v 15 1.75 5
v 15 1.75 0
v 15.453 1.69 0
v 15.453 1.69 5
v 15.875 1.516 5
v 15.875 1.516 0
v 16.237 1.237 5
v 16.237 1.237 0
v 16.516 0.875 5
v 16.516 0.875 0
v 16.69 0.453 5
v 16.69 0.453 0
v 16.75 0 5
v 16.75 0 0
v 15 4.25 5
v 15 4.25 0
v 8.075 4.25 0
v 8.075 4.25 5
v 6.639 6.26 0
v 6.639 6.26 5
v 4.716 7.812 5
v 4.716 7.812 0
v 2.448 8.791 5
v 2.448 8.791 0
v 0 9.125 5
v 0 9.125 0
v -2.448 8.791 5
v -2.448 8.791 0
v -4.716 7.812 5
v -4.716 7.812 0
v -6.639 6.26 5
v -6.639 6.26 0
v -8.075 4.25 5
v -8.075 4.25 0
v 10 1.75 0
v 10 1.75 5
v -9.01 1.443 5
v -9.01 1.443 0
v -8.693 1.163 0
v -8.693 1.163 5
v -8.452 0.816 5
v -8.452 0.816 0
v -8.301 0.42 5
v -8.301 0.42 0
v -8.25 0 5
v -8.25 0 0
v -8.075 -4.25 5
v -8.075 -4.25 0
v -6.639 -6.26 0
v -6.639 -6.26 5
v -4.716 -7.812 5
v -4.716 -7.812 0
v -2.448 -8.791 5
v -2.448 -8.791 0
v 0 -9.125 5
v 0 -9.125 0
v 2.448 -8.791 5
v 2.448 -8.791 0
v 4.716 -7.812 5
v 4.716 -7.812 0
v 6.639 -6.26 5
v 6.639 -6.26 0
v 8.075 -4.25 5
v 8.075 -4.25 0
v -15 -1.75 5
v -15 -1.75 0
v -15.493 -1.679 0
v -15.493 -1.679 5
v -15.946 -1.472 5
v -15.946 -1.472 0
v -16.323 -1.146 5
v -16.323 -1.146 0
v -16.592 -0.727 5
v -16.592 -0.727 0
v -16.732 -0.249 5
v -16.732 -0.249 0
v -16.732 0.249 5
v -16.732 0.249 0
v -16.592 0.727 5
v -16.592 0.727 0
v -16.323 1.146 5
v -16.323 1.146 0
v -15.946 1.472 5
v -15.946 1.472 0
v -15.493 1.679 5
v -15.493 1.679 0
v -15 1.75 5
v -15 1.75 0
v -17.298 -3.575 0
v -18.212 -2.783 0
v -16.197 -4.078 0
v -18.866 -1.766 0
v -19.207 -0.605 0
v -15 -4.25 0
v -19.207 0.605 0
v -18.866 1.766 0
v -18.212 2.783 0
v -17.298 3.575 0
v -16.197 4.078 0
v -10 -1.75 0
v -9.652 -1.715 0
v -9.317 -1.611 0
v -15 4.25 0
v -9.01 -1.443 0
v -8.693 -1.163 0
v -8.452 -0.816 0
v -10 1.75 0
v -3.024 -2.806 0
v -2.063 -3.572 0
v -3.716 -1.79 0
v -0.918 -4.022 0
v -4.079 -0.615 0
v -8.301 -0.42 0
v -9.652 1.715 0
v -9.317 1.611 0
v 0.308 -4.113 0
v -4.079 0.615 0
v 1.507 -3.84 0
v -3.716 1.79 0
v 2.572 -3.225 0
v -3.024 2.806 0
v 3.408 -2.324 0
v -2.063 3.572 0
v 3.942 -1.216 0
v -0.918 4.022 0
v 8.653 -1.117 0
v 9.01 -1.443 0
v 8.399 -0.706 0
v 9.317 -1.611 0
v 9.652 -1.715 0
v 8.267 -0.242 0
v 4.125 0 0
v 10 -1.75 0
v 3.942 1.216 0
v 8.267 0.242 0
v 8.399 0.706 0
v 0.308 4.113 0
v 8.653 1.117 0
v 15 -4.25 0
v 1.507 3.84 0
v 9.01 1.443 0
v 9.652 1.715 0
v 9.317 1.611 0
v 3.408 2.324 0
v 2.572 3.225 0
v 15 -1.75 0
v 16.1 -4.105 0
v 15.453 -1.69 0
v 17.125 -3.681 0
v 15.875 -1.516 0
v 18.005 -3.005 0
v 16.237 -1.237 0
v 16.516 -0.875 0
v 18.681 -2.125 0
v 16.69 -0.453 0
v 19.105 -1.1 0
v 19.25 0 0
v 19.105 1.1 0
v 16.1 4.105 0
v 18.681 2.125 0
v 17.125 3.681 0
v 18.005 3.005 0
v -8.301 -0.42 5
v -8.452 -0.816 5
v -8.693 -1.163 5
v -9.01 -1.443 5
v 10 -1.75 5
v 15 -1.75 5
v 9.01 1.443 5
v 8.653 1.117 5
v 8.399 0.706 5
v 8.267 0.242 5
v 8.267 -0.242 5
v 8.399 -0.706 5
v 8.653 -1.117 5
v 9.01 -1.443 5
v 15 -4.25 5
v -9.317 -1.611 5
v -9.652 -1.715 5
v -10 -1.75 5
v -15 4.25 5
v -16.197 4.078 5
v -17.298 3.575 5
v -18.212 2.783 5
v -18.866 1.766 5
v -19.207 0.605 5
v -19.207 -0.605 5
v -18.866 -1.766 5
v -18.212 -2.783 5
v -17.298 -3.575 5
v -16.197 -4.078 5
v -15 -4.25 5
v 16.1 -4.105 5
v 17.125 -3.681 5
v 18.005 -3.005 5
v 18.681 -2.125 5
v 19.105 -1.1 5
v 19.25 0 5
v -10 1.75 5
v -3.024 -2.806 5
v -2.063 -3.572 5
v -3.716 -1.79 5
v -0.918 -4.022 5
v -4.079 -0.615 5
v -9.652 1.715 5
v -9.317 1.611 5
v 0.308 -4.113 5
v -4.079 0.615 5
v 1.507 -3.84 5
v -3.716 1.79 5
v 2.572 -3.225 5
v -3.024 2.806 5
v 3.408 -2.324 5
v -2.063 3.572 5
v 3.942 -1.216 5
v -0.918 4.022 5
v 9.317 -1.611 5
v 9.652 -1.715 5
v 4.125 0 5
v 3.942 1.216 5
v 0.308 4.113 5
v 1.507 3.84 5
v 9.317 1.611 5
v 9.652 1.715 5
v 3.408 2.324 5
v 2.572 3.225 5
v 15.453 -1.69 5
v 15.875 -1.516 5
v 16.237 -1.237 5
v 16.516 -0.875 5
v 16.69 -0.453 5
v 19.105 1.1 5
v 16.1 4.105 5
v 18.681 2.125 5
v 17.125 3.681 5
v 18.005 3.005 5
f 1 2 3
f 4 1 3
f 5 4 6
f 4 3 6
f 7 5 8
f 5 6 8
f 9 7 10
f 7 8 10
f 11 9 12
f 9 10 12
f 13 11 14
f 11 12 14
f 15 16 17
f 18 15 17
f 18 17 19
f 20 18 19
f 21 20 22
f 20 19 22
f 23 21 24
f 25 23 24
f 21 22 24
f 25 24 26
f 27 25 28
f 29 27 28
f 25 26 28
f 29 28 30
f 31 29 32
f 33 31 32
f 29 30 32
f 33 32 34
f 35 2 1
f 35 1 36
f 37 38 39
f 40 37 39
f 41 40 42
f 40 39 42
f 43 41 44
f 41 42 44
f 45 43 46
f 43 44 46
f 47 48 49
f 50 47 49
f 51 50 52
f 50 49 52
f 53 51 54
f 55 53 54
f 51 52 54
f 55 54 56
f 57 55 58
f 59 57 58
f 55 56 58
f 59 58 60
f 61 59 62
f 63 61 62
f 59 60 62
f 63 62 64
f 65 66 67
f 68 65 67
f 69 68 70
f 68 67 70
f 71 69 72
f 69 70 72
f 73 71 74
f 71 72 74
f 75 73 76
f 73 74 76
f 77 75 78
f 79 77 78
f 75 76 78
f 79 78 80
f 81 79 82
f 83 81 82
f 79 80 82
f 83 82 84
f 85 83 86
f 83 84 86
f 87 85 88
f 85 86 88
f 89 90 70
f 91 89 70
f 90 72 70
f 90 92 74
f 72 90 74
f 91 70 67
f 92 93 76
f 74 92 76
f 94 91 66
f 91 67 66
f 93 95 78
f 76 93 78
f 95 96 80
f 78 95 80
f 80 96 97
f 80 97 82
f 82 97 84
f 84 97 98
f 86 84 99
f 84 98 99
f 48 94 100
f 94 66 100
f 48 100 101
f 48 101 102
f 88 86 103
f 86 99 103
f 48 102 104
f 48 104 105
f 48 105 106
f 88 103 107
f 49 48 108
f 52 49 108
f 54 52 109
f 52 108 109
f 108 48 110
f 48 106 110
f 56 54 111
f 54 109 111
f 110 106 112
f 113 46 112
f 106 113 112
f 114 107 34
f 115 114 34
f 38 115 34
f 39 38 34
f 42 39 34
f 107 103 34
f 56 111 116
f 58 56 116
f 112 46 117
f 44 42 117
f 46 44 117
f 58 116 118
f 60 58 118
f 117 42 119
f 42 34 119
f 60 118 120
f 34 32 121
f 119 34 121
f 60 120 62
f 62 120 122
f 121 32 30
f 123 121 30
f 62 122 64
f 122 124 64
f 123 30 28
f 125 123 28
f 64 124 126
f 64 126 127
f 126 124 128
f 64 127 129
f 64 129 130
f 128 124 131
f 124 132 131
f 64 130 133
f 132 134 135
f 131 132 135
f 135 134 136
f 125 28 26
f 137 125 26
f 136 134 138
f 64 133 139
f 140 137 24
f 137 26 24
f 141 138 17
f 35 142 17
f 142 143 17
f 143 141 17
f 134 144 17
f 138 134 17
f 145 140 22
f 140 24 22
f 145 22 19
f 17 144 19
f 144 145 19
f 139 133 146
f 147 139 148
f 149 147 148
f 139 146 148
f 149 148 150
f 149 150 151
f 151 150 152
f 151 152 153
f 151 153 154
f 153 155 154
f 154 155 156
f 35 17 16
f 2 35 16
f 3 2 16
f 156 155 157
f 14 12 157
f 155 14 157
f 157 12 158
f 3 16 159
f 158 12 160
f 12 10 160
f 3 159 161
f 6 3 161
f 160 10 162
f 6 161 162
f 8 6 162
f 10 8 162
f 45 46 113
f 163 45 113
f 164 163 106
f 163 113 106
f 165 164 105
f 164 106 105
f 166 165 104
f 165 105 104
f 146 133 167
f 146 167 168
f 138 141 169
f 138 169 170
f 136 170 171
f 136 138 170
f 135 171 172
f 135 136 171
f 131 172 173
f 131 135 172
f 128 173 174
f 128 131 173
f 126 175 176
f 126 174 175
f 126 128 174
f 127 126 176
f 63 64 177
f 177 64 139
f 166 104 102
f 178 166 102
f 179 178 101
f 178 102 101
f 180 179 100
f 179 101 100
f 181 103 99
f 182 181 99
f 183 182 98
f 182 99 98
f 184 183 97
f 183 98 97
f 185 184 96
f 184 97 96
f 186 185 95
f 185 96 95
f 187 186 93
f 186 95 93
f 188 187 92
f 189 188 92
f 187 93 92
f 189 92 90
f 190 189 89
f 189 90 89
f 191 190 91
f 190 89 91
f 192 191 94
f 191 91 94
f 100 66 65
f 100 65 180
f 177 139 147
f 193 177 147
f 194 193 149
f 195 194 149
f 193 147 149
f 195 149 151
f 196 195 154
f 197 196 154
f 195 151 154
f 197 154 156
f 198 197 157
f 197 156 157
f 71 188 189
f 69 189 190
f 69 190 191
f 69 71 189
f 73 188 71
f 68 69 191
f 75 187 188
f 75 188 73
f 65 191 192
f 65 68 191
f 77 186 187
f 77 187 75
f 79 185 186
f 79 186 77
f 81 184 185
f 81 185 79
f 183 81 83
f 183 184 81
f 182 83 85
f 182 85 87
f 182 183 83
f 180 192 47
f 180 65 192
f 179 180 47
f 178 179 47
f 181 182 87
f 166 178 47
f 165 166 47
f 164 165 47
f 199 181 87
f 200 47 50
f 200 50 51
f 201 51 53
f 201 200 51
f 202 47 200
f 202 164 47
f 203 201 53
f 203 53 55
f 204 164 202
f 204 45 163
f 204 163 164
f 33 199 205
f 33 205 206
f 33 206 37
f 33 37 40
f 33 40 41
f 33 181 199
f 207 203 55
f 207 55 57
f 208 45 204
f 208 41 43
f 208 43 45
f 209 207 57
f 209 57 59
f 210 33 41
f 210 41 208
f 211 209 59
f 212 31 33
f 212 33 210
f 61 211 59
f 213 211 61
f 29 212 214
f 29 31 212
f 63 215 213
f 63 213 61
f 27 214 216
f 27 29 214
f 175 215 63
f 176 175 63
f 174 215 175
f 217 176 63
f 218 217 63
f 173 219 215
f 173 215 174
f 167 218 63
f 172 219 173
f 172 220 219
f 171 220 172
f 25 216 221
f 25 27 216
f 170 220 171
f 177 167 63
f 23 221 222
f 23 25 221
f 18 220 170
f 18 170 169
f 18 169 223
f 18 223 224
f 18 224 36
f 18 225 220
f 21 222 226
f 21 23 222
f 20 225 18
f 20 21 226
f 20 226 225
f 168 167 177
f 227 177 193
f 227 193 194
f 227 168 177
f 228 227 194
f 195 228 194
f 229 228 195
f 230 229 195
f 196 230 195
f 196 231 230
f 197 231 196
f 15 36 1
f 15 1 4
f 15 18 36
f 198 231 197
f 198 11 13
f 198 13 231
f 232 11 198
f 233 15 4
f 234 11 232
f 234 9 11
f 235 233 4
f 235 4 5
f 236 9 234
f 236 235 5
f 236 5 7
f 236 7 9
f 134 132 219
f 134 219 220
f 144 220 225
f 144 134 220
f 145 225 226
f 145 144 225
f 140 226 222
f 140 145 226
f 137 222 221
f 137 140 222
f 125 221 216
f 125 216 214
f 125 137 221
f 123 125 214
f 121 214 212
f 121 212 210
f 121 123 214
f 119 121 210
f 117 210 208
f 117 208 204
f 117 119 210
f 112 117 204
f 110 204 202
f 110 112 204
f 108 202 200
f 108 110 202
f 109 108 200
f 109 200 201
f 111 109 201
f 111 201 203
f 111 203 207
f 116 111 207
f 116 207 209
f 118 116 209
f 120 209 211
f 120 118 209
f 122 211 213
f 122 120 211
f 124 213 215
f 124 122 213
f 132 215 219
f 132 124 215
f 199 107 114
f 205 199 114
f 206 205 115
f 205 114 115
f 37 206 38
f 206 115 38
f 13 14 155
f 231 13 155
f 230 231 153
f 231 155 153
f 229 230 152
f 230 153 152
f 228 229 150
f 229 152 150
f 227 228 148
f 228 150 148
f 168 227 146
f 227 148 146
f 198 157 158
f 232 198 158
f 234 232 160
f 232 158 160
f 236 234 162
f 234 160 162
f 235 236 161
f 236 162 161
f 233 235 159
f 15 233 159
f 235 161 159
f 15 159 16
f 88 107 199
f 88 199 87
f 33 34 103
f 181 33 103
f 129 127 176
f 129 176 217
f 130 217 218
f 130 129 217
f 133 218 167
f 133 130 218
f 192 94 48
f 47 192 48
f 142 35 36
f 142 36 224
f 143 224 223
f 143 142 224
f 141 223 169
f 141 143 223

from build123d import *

# Parameters (mm, degrees)
F0_R     = 4.125
F1_DEPTH = 5
F2_DEPTH = 5
F3_DEPTH = 5
F4_DEPTH = 5
F5_DEPTH = 25
F6_DEPTH = 25


with BuildPart() as f1:
    # F0 (on Top) → F1 (new body)
    with BuildSketch(Plane.XY):
        with BuildLine():
            Line((-8.0748451998, 4.25), (8.0748451998, 4.25))
            ThreePointArc((8.0748451998, 4.25), (0, 9.125), (-8.0748451998, 4.25))
        make_face()
        with BuildLine():
            ThreePointArc((8.26015625, -3.8775564117), (5.75, 0), (8.26015625, 3.8775564117))
            ThreePointArc((8.26015625, 3.8775564117), (8.1696234092, 4.0648343573), (8.0748451998, 4.25))
            Line((8.0748451998, 4.25), (-8.0748451998, 4.25))
            ThreePointArc((-8.0748451998, 4.25), (-8.1696234092, 4.0648343573), (-8.26015625, 3.8775564117))
            ThreePointArc((-8.26015625, 3.8775564117), (-6.4323091545, 2.3095631689), (-5.75, 0))
            ThreePointArc((-5.75, 0), (-6.4323091545, -2.3095631689), (-8.26015625, -3.8775564117))
            ThreePointArc((-8.26015625, -3.8775564117), (-8.1696234092, -4.0648343573), (-8.0748451998, -4.25))
            Line((-8.0748451998, -4.25), (8.0748451998, -4.25))
            ThreePointArc((8.0748451998, -4.25), (8.1696234092, -4.0648343573), (8.26015625, -3.8775564117))
        make_face()
        Circle(F0_R, mode=Mode.SUBTRACT)
        with BuildLine():
            ThreePointArc((-8.0748451998, -4.25), (0, -9.125), (8.0748451998, -4.25))
            Line((8.0748451998, -4.25), (-8.0748451998, -4.25))
        make_face()
        with BuildLine():
            ThreePointArc((-5.75, 0), (-6.4323091545, 2.3095631689), (-8.26015625, 3.8775564117))
            ThreePointArc((-8.26015625, 3.8775564117), (-8.7205215176, 2.6866576746), (-9.01015625, 1.4431595028))
            ThreePointArc((-9.01015625, 1.4431595028), (-8.4516578927, 0.8155591449), (-8.25, 0))
            ThreePointArc((-8.25, 0), (-8.4516578927, -0.8155591449), (-9.01015625, -1.4431595028))
            ThreePointArc((-9.01015625, -1.4431595028), (-8.7205215176, -2.6866576746), (-8.26015625, -3.8775564117))
            ThreePointArc((-8.26015625, -3.8775564117), (-6.4323091545, -2.3095631689), (-5.75, 0))
        make_face()
        with BuildLine():
            ThreePointArc((-9.01015625, 1.4431595028), (-8.7205215176, 2.6866576746), (-8.26015625, 3.8775564117))
            ThreePointArc((-8.26015625, 3.8775564117), (-9.1103693883, 4.1558461683), (-10, 4.25))
            ThreePointArc((-10, 4.25), (-11.3144466464, 4.041624675), (-12.5, 3.4369317712))
            ThreePointArc((-12.5, 3.4369317712), (-11.703765196, 2.6827851418), (-11.1270166538, 1.75))
            Line((-11.1270166538, 1.75), (-10, 1.75))
            ThreePointArc((-10, 1.75), (-9.4818441981, 1.6715306055), (-9.01015625, 1.4431595028))
        make_face()
        with BuildLine():
            ThreePointArc((-12.5, 3.4369317712), (-11.3144466464, 4.041624675), (-10, 4.25))
            Line((-10, 4.25), (-15, 4.25))
            ThreePointArc((-15, 4.25), (-13.6855533536, 4.041624675), (-12.5, 3.4369317712))
        make_face()
        with BuildLine():
            ThreePointArc((-13.8729833462, 1.75), (-13.296234804, 2.6827851418), (-12.5, 3.4369317712))
            ThreePointArc((-12.5, 3.4369317712), (-13.6855533536, 4.041624675), (-15, 4.25))
            Line((-15, 4.25), (-15, 1.75))
            Line((-15, 1.75), (-13.8729833462, 1.75))
        make_face()
        with BuildLine():
            Line((-15, 1.75), (-15, 4.25))
            ThreePointArc((-15, 4.25), (-19.25, 0), (-15, -4.25))
            Line((-15, -4.25), (-15, -1.75))
            ThreePointArc((-15, -1.75), (-16.75, 0), (-15, 1.75))
        make_face()
        with BuildLine():
            ThreePointArc((-11.1270166538, 1.75), (-11.703765196, 2.6827851418), (-12.5, 3.4369317712))
            ThreePointArc((-12.5, 3.4369317712), (-13.296234804, 2.6827851418), (-13.8729833462, 1.75))
            Line((-13.8729833462, 1.75), (-11.1270166538, 1.75))
        make_face()
        with BuildLine():
            ThreePointArc((-11, 1.4361406616), (-11.0603815396, 1.5943357195), (-11.1270166538, 1.75))
            Line((-11.1270166538, 1.75), (-13.8729833462, 1.75))
            ThreePointArc((-13.8729833462, 1.75), (-13.9396184604, 1.5943357195), (-14, 1.4361406616))
            ThreePointArc((-14, 1.4361406616), (-13.4487907943, 0.8100925873), (-13.25, 0))
            ThreePointArc((-13.25, 0), (-13.4487907943, -0.8100925873), (-14, -1.4361406616))
            ThreePointArc((-14, -1.4361406616), (-13.9396184604, -1.5943357195), (-13.8729833462, -1.75))
            Line((-13.8729833462, -1.75), (-11.1270166538, -1.75))
            ThreePointArc((-11.1270166538, -1.75), (-11.0603815396, -1.5943357195), (-11, -1.4361406616))
            ThreePointArc((-11, -1.4361406616), (-11.75, 0), (-11, 1.4361406616))
        make_face()
        with BuildLine():
            ThreePointArc((-15, -4.25), (-13.6855533536, -4.041624675), (-12.5, -3.4369317712))
            ThreePointArc((-12.5, -3.4369317712), (-13.296234804, -2.6827851418), (-13.8729833462, -1.75))
            Line((-13.8729833462, -1.75), (-15, -1.75))
            Line((-15, -1.75), (-15, -4.25))
        make_face()
        with BuildLine():
            ThreePointArc((-13.8729833462, -1.75), (-13.296234804, -2.6827851418), (-12.5, -3.4369317712))
            ThreePointArc((-12.5, -3.4369317712), (-11.703765196, -2.6827851418), (-11.1270166538, -1.75))
            Line((-11.1270166538, -1.75), (-13.8729833462, -1.75))
        make_face()
        with BuildLine():
            ThreePointArc((-10, -4.25), (-9.1103693883, -4.1558461683), (-8.26015625, -3.8775564117))
            ThreePointArc((-8.26015625, -3.8775564117), (-8.7205215176, -2.6866576746), (-9.01015625, -1.4431595028))
            ThreePointArc((-9.01015625, -1.4431595028), (-9.4818441981, -1.6715306055), (-10, -1.75))
            Line((-10, -1.75), (-11.1270166538, -1.75))
            ThreePointArc((-11.1270166538, -1.75), (-11.703765196, -2.6827851418), (-12.5, -3.4369317712))
            ThreePointArc((-12.5, -3.4369317712), (-11.3144466464, -4.041624675), (-10, -4.25))
        make_face()
        with BuildLine():
            Line((-15, -4.25), (-10, -4.25))
            ThreePointArc((-10, -4.25), (-11.3144466464, -4.041624675), (-12.5, -3.4369317712))
            ThreePointArc((-12.5, -3.4369317712), (-13.6855533536, -4.041624675), (-15, -4.25))
        make_face()
        with BuildLine():
            ThreePointArc((-14, 1.4361406616), (-13.9396184604, 1.5943357195), (-13.8729833462, 1.75))
            Line((-13.8729833462, 1.75), (-15, 1.75))
            ThreePointArc((-15, 1.75), (-14.4759514134, 1.6696925103), (-14, 1.4361406616))
        make_face()
        with BuildLine():
            ThreePointArc((-11, 1.4361406616), (-10.5240485866, 1.6696925103), (-10, 1.75))
            Line((-10, 1.75), (-11.1270166538, 1.75))
            ThreePointArc((-11.1270166538, 1.75), (-11.0603815396, 1.5943357195), (-11, 1.4361406616))
        make_face()
        with BuildLine():
            Line((-15, -1.75), (-13.8729833462, -1.75))
            ThreePointArc((-13.8729833462, -1.75), (-13.9396184604, -1.5943357195), (-14, -1.4361406616))
            ThreePointArc((-14, -1.4361406616), (-14.4759514134, -1.6696925103), (-15, -1.75))
        make_face()
        with BuildLine():
            Line((-11.1270166538, -1.75), (-10, -1.75))
            ThreePointArc((-10, -1.75), (-10.5240485866, -1.6696925103), (-11, -1.4361406616))
            ThreePointArc((-11, -1.4361406616), (-11.0603815396, -1.5943357195), (-11.1270166538, -1.75))
        make_face()
    extrude(amount=F1_DEPTH)



with BuildPart() as f1b:
    # F0 (on Top) → F1, piece 2 (new body)
    with BuildSketch(Plane.XY):
        with BuildLine():
            Line((15, 4.25), (15, 1.75))
            ThreePointArc((15, 1.75), (16.2374368671, 1.2374368671), (16.75, 0))
            ThreePointArc((16.75, 0), (16.2374368671, -1.2374368671), (15, -1.75))
            Line((15, -1.75), (15, -4.25))
            ThreePointArc((15, -4.25), (18.00520382, -3.00520382), (19.25, 0))
            ThreePointArc((19.25, 0), (18.00520382, 3.00520382), (15, 4.25))
        make_face()
    extrude(amount=F1_DEPTH)


with BuildPart() as f1c:
    # F0 (on Top) → F1, piece 3 (new body)
    with BuildSketch(Plane.XY):
        with BuildLine():
            ThreePointArc((12.5, 3.4369317712), (11.703765196, 2.6827851418), (11.1270166538, 1.75))
            Line((11.1270166538, 1.75), (13.8729833462, 1.75))
            ThreePointArc((13.8729833462, 1.75), (13.296234804, 2.6827851418), (12.5, 3.4369317712))
        make_face()
        with BuildLine():
            ThreePointArc((11, 1.4361406616), (11.5512092057, 0.8100925873), (11.75, 0))
            ThreePointArc((11.75, 0), (11.5512092057, -0.8100925873), (11, -1.4361406616))
            ThreePointArc((11, -1.4361406616), (11.0603815396, -1.5943357195), (11.1270166538, -1.75))
            Line((11.1270166538, -1.75), (13.8729833462, -1.75))
            ThreePointArc((13.8729833462, -1.75), (13.9396184604, -1.5943357195), (14, -1.4361406616))
            ThreePointArc((14, -1.4361406616), (13.25, 0), (14, 1.4361406616))
            ThreePointArc((14, 1.4361406616), (13.9396184604, 1.5943357195), (13.8729833462, 1.75))
            Line((13.8729833462, 1.75), (11.1270166538, 1.75))
            ThreePointArc((11.1270166538, 1.75), (11.0603815396, 1.5943357195), (11, 1.4361406616))
        make_face()
        with BuildLine():
            ThreePointArc((14, -1.4361406616), (13.9396184604, -1.5943357195), (13.8729833462, -1.75))
            Line((13.8729833462, -1.75), (15, -1.75))
            ThreePointArc((15, -1.75), (14.4759514134, -1.6696925103), (14, -1.4361406616))
        make_face()
        with BuildLine():
            Line((15, 1.75), (13.8729833462, 1.75))
            ThreePointArc((13.8729833462, 1.75), (13.9396184604, 1.5943357195), (14, 1.4361406616))
            ThreePointArc((14, 1.4361406616), (14.4759514134, 1.6696925103), (15, 1.75))
        make_face()
    extrude(amount=F1_DEPTH)


with BuildPart() as f1_1:
    add(f1.part)

    add(f1b.part)  # F2 merges F1b

    add(f1c.part)  # F2 merges F1c
    # F0 (on Top) → F2 (join)
    with BuildSketch(Plane.XY):
        with BuildLine():
            ThreePointArc((12.5, 3.4369317712), (13.296234804, 2.6827851418), (13.8729833462, 1.75))
            Line((13.8729833462, 1.75), (15, 1.75))
            Line((15, 1.75), (15, 4.25))
            ThreePointArc((15, 4.25), (13.6855533536, 4.041624675), (12.5, 3.4369317712))
        make_face()
        with BuildLine():
            ThreePointArc((10, 4.25), (11.3144466464, 4.041624675), (12.5, 3.4369317712))
            ThreePointArc((12.5, 3.4369317712), (13.6855533536, 4.041624675), (15, 4.25))
            Line((15, 4.25), (10, 4.25))
        make_face()
        with BuildLine():
            ThreePointArc((9.01015625, 1.4431595028), (9.4818441981, 1.6715306055), (10, 1.75))
            Line((10, 1.75), (11.1270166538, 1.75))
            ThreePointArc((11.1270166538, 1.75), (11.703765196, 2.6827851418), (12.5, 3.4369317712))
            ThreePointArc((12.5, 3.4369317712), (11.3144466464, 4.041624675), (10, 4.25))
            ThreePointArc((10, 4.25), (9.1103693883, 4.1558461683), (8.26015625, 3.8775564117))
            ThreePointArc((8.26015625, 3.8775564117), (8.7205215176, 2.6866576746), (9.01015625, 1.4431595028))
        make_face()
        with BuildLine():
            ThreePointArc((9.01015625, -1.4431595028), (8.25, 0), (9.01015625, 1.4431595028))
            ThreePointArc((9.01015625, 1.4431595028), (8.7205215176, 2.6866576746), (8.26015625, 3.8775564117))
            ThreePointArc((8.26015625, 3.8775564117), (5.75, 0), (8.26015625, -3.8775564117))
            ThreePointArc((8.26015625, -3.8775564117), (8.7205215176, -2.6866576746), (9.01015625, -1.4431595028))
        make_face()
        with BuildLine():
            Line((15, -1.75), (13.8729833462, -1.75))
            ThreePointArc((13.8729833462, -1.75), (13.296234804, -2.6827851418), (12.5, -3.4369317712))
            ThreePointArc((12.5, -3.4369317712), (13.6855533536, -4.041624675), (15, -4.25))
            Line((15, -4.25), (15, -1.75))
        make_face()
        with BuildLine():
            ThreePointArc((15, -4.25), (13.6855533536, -4.041624675), (12.5, -3.4369317712))
            ThreePointArc((12.5, -3.4369317712), (11.3144466464, -4.041624675), (10, -4.25))
            Line((10, -4.25), (15, -4.25))
        make_face()
        with BuildLine():
            Line((11.1270166538, -1.75), (10, -1.75))
            ThreePointArc((10, -1.75), (9.4818441981, -1.6715306055), (9.01015625, -1.4431595028))
            ThreePointArc((9.01015625, -1.4431595028), (8.7205215176, -2.6866576746), (8.26015625, -3.8775564117))
            ThreePointArc((8.26015625, -3.8775564117), (9.1103693883, -4.1558461683), (10, -4.25))
            ThreePointArc((10, -4.25), (11.3144466464, -4.041624675), (12.5, -3.4369317712))
            ThreePointArc((12.5, -3.4369317712), (11.703765196, -2.6827851418), (11.1270166538, -1.75))
        make_face()
        with BuildLine():
            Line((13.8729833462, -1.75), (11.1270166538, -1.75))
            ThreePointArc((11.1270166538, -1.75), (11.703765196, -2.6827851418), (12.5, -3.4369317712))
            ThreePointArc((12.5, -3.4369317712), (13.296234804, -2.6827851418), (13.8729833462, -1.75))
        make_face()
        with BuildLine():
            ThreePointArc((10, 1.75), (10.5240485866, 1.6696925103), (11, 1.4361406616))
            ThreePointArc((11, 1.4361406616), (11.0603815396, 1.5943357195), (11.1270166538, 1.75))
            Line((11.1270166538, 1.75), (10, 1.75))
        make_face()
        with BuildLine():
            ThreePointArc((11.1270166538, -1.75), (11.0603815396, -1.5943357195), (11, -1.4361406616))
            ThreePointArc((11, -1.4361406616), (10.5240485866, -1.6696925103), (10, -1.75))
            Line((10, -1.75), (11.1270166538, -1.75))
        make_face()
    extrude(amount=F2_DEPTH)

    # F0 (on Top) → F3 (join)
    with BuildSketch(Plane.XY):
        with BuildLine():
            ThreePointArc((8.0748451998, 4.25), (8.1696234092, 4.0648343573), (8.26015625, 3.8775564117))
            ThreePointArc((8.26015625, 3.8775564117), (9.1103693883, 4.1558461683), (10, 4.25))
            Line((10, 4.25), (8.0748451998, 4.25))
        make_face()
        with BuildLine():
            ThreePointArc((10, -4.25), (9.1103693883, -4.1558461683), (8.26015625, -3.8775564117))
            ThreePointArc((8.26015625, -3.8775564117), (8.1696234092, -4.0648343573), (8.0748451998, -4.25))
            Line((8.0748451998, -4.25), (10, -4.25))
        make_face()
        with BuildLine():
            Line((-10, -4.25), (-8.0748451998, -4.25))
            ThreePointArc((-8.0748451998, -4.25), (-8.1696234092, -4.0648343573), (-8.26015625, -3.8775564117))
            ThreePointArc((-8.26015625, -3.8775564117), (-9.1103693883, -4.1558461683), (-10, -4.25))
        make_face()
        with BuildLine():
            ThreePointArc((-8.26015625, 3.8775564117), (-8.1696234092, 4.0648343573), (-8.0748451998, 4.25))
            Line((-8.0748451998, 4.25), (-10, 4.25))
            ThreePointArc((-10, 4.25), (-9.1103693883, 4.1558461683), (-8.26015625, 3.8775564117))
        make_face()
    extrude(amount=F3_DEPTH)

    # F0 (on Top) → F4 (join)
    with BuildSketch(Plane.XY):
        with BuildLine():
            ThreePointArc((11, -1.4361406616), (11.5512092057, -0.8100925873), (11.75, 0))
            ThreePointArc((11.75, 0), (11.5512092057, 0.8100925873), (11, 1.4361406616))
            ThreePointArc((11, 1.4361406616), (10.75, 0), (11, -1.4361406616))
        make_face()
        with BuildLine():
            Line((10, -1.75), (10, 1.75))
            ThreePointArc((10, 1.75), (9.4818441981, 1.6715306055), (9.01015625, 1.4431595028))
            ThreePointArc((9.01015625, 1.4431595028), (9.0962437517, 0.7238609047), (9.125, 0))
            ThreePointArc((9.125, 0), (9.0962437517, -0.7238609047), (9.01015625, -1.4431595028))
            ThreePointArc((9.01015625, -1.4431595028), (9.4818441981, -1.6715306055), (10, -1.75))
        make_face()
        with BuildLine():
            ThreePointArc((9.125, 0), (9.0962437517, 0.7238609047), (9.01015625, 1.4431595028))
            ThreePointArc((9.01015625, 1.4431595028), (8.25, 0), (9.01015625, -1.4431595028))
            ThreePointArc((9.01015625, -1.4431595028), (9.0962437517, -0.7238609047), (9.125, 0))
        make_face()
        with BuildLine():
            ThreePointArc((11, -1.4361406616), (10.75, 0), (11, 1.4361406616))
            ThreePointArc((11, 1.4361406616), (10.5240485866, 1.6696925103), (10, 1.75))
            Line((10, 1.75), (10, -1.75))
            ThreePointArc((10, -1.75), (10.5240485866, -1.6696925103), (11, -1.4361406616))
        make_face()
    extrude(amount=F4_DEPTH)

    # F0 (on Top) → F5 (cut)
    with BuildSketch(Plane.XY):
        with BuildLine():
            ThreePointArc((-11, 1.4361406616), (-11.0603815396, 1.5943357195), (-11.1270166538, 1.75))
            Line((-11.1270166538, 1.75), (-13.8729833462, 1.75))
            ThreePointArc((-13.8729833462, 1.75), (-13.9396184604, 1.5943357195), (-14, 1.4361406616))
            ThreePointArc((-14, 1.4361406616), (-13.4487907943, 0.8100925873), (-13.25, 0))
            ThreePointArc((-13.25, 0), (-13.4487907943, -0.8100925873), (-14, -1.4361406616))
            ThreePointArc((-14, -1.4361406616), (-13.9396184604, -1.5943357195), (-13.8729833462, -1.75))
            Line((-13.8729833462, -1.75), (-11.1270166538, -1.75))
            ThreePointArc((-11.1270166538, -1.75), (-11.0603815396, -1.5943357195), (-11, -1.4361406616))
            ThreePointArc((-11, -1.4361406616), (-11.75, 0), (-11, 1.4361406616))
        make_face()
        with BuildLine():
            Line((-15, -1.75), (-13.8729833462, -1.75))
            ThreePointArc((-13.8729833462, -1.75), (-13.9396184604, -1.5943357195), (-14, -1.4361406616))
            ThreePointArc((-14, -1.4361406616), (-14.4759514134, -1.6696925103), (-15, -1.75))
        make_face()
        with BuildLine():
            ThreePointArc((-14, 1.4361406616), (-13.9396184604, 1.5943357195), (-13.8729833462, 1.75))
            Line((-13.8729833462, 1.75), (-15, 1.75))
            ThreePointArc((-15, 1.75), (-14.4759514134, 1.6696925103), (-14, 1.4361406616))
        make_face()
        with BuildLine():
            ThreePointArc((-11, 1.4361406616), (-10.5240485866, 1.6696925103), (-10, 1.75))
            Line((-10, 1.75), (-11.1270166538, 1.75))
            ThreePointArc((-11.1270166538, 1.75), (-11.0603815396, 1.5943357195), (-11, 1.4361406616))
        make_face()
        with BuildLine():
            Line((-11.1270166538, -1.75), (-10, -1.75))
            ThreePointArc((-10, -1.75), (-10.5240485866, -1.6696925103), (-11, -1.4361406616))
            ThreePointArc((-11, -1.4361406616), (-11.0603815396, -1.5943357195), (-11.1270166538, -1.75))
        make_face()
    extrude(amount=F5_DEPTH, mode=Mode.SUBTRACT)

    # F0 (on Top) → F6 (cut)
    with BuildSketch(Plane.XY):
        with BuildLine():
            ThreePointArc((9.125, 0), (9.0962437517, 0.7238609047), (9.01015625, 1.4431595028))
            ThreePointArc((9.01015625, 1.4431595028), (8.25, 0), (9.01015625, -1.4431595028))
            ThreePointArc((9.01015625, -1.4431595028), (9.0962437517, -0.7238609047), (9.125, 0))
        make_face()
        with BuildLine():
            Line((10, -1.75), (10, 1.75))
            ThreePointArc((10, 1.75), (9.4818441981, 1.6715306055), (9.01015625, 1.4431595028))
            ThreePointArc((9.01015625, 1.4431595028), (9.0962437517, 0.7238609047), (9.125, 0))
            ThreePointArc((9.125, 0), (9.0962437517, -0.7238609047), (9.01015625, -1.4431595028))
            ThreePointArc((9.01015625, -1.4431595028), (9.4818441981, -1.6715306055), (10, -1.75))
        make_face()
        with BuildLine():
            ThreePointArc((11, -1.4361406616), (10.75, 0), (11, 1.4361406616))
            ThreePointArc((11, 1.4361406616), (10.5240485866, 1.6696925103), (10, 1.75))
            Line((10, 1.75), (10, -1.75))
            ThreePointArc((10, -1.75), (10.5240485866, -1.6696925103), (11, -1.4361406616))
        make_face()
        with BuildLine():
            ThreePointArc((11, -1.4361406616), (11.5512092057, -0.8100925873), (11.75, 0))
            ThreePointArc((11.75, 0), (11.5512092057, 0.8100925873), (11, 1.4361406616))
            ThreePointArc((11, 1.4361406616), (10.75, 0), (11, -1.4361406616))
        make_face()
        with BuildLine():
            ThreePointArc((11.1270166538, -1.75), (11.0603815396, -1.5943357195), (11, -1.4361406616))
            ThreePointArc((11, -1.4361406616), (10.5240485866, -1.6696925103), (10, -1.75))
            Line((10, -1.75), (11.1270166538, -1.75))
        make_face()
        with BuildLine():
            ThreePointArc((10, 1.75), (10.5240485866, 1.6696925103), (11, 1.4361406616))
            ThreePointArc((11, 1.4361406616), (11.0603815396, 1.5943357195), (11.1270166538, 1.75))
            Line((11.1270166538, 1.75), (10, 1.75))
        make_face()
        with BuildLine():
            ThreePointArc((14, -1.4361406616), (13.9396184604, -1.5943357195), (13.8729833462, -1.75))
            Line((13.8729833462, -1.75), (15, -1.75))
            ThreePointArc((15, -1.75), (14.4759514134, -1.6696925103), (14, -1.4361406616))
        make_face()
        with BuildLine():
            Line((15, 1.75), (13.8729833462, 1.75))
            ThreePointArc((13.8729833462, 1.75), (13.9396184604, 1.5943357195), (14, 1.4361406616))
            ThreePointArc((14, 1.4361406616), (14.4759514134, 1.6696925103), (15, 1.75))
        make_face()
        with BuildLine():
            ThreePointArc((11, 1.4361406616), (11.5512092057, 0.8100925873), (11.75, 0))
            ThreePointArc((11.75, 0), (11.5512092057, -0.8100925873), (11, -1.4361406616))
            ThreePointArc((11, -1.4361406616), (11.0603815396, -1.5943357195), (11.1270166538, -1.75))
            Line((11.1270166538, -1.75), (13.8729833462, -1.75))
            ThreePointArc((13.8729833462, -1.75), (13.9396184604, -1.5943357195), (14, -1.4361406616))
            ThreePointArc((14, -1.4361406616), (13.25, 0), (14, 1.4361406616))
            ThreePointArc((14, 1.4361406616), (13.9396184604, 1.5943357195), (13.8729833462, 1.75))
            Line((13.8729833462, 1.75), (11.1270166538, 1.75))
            ThreePointArc((11.1270166538, 1.75), (11.0603815396, 1.5943357195), (11, 1.4361406616))
        make_face()
    extrude(amount=F6_DEPTH, mode=Mode.SUBTRACT)


solid = f1_1.part
